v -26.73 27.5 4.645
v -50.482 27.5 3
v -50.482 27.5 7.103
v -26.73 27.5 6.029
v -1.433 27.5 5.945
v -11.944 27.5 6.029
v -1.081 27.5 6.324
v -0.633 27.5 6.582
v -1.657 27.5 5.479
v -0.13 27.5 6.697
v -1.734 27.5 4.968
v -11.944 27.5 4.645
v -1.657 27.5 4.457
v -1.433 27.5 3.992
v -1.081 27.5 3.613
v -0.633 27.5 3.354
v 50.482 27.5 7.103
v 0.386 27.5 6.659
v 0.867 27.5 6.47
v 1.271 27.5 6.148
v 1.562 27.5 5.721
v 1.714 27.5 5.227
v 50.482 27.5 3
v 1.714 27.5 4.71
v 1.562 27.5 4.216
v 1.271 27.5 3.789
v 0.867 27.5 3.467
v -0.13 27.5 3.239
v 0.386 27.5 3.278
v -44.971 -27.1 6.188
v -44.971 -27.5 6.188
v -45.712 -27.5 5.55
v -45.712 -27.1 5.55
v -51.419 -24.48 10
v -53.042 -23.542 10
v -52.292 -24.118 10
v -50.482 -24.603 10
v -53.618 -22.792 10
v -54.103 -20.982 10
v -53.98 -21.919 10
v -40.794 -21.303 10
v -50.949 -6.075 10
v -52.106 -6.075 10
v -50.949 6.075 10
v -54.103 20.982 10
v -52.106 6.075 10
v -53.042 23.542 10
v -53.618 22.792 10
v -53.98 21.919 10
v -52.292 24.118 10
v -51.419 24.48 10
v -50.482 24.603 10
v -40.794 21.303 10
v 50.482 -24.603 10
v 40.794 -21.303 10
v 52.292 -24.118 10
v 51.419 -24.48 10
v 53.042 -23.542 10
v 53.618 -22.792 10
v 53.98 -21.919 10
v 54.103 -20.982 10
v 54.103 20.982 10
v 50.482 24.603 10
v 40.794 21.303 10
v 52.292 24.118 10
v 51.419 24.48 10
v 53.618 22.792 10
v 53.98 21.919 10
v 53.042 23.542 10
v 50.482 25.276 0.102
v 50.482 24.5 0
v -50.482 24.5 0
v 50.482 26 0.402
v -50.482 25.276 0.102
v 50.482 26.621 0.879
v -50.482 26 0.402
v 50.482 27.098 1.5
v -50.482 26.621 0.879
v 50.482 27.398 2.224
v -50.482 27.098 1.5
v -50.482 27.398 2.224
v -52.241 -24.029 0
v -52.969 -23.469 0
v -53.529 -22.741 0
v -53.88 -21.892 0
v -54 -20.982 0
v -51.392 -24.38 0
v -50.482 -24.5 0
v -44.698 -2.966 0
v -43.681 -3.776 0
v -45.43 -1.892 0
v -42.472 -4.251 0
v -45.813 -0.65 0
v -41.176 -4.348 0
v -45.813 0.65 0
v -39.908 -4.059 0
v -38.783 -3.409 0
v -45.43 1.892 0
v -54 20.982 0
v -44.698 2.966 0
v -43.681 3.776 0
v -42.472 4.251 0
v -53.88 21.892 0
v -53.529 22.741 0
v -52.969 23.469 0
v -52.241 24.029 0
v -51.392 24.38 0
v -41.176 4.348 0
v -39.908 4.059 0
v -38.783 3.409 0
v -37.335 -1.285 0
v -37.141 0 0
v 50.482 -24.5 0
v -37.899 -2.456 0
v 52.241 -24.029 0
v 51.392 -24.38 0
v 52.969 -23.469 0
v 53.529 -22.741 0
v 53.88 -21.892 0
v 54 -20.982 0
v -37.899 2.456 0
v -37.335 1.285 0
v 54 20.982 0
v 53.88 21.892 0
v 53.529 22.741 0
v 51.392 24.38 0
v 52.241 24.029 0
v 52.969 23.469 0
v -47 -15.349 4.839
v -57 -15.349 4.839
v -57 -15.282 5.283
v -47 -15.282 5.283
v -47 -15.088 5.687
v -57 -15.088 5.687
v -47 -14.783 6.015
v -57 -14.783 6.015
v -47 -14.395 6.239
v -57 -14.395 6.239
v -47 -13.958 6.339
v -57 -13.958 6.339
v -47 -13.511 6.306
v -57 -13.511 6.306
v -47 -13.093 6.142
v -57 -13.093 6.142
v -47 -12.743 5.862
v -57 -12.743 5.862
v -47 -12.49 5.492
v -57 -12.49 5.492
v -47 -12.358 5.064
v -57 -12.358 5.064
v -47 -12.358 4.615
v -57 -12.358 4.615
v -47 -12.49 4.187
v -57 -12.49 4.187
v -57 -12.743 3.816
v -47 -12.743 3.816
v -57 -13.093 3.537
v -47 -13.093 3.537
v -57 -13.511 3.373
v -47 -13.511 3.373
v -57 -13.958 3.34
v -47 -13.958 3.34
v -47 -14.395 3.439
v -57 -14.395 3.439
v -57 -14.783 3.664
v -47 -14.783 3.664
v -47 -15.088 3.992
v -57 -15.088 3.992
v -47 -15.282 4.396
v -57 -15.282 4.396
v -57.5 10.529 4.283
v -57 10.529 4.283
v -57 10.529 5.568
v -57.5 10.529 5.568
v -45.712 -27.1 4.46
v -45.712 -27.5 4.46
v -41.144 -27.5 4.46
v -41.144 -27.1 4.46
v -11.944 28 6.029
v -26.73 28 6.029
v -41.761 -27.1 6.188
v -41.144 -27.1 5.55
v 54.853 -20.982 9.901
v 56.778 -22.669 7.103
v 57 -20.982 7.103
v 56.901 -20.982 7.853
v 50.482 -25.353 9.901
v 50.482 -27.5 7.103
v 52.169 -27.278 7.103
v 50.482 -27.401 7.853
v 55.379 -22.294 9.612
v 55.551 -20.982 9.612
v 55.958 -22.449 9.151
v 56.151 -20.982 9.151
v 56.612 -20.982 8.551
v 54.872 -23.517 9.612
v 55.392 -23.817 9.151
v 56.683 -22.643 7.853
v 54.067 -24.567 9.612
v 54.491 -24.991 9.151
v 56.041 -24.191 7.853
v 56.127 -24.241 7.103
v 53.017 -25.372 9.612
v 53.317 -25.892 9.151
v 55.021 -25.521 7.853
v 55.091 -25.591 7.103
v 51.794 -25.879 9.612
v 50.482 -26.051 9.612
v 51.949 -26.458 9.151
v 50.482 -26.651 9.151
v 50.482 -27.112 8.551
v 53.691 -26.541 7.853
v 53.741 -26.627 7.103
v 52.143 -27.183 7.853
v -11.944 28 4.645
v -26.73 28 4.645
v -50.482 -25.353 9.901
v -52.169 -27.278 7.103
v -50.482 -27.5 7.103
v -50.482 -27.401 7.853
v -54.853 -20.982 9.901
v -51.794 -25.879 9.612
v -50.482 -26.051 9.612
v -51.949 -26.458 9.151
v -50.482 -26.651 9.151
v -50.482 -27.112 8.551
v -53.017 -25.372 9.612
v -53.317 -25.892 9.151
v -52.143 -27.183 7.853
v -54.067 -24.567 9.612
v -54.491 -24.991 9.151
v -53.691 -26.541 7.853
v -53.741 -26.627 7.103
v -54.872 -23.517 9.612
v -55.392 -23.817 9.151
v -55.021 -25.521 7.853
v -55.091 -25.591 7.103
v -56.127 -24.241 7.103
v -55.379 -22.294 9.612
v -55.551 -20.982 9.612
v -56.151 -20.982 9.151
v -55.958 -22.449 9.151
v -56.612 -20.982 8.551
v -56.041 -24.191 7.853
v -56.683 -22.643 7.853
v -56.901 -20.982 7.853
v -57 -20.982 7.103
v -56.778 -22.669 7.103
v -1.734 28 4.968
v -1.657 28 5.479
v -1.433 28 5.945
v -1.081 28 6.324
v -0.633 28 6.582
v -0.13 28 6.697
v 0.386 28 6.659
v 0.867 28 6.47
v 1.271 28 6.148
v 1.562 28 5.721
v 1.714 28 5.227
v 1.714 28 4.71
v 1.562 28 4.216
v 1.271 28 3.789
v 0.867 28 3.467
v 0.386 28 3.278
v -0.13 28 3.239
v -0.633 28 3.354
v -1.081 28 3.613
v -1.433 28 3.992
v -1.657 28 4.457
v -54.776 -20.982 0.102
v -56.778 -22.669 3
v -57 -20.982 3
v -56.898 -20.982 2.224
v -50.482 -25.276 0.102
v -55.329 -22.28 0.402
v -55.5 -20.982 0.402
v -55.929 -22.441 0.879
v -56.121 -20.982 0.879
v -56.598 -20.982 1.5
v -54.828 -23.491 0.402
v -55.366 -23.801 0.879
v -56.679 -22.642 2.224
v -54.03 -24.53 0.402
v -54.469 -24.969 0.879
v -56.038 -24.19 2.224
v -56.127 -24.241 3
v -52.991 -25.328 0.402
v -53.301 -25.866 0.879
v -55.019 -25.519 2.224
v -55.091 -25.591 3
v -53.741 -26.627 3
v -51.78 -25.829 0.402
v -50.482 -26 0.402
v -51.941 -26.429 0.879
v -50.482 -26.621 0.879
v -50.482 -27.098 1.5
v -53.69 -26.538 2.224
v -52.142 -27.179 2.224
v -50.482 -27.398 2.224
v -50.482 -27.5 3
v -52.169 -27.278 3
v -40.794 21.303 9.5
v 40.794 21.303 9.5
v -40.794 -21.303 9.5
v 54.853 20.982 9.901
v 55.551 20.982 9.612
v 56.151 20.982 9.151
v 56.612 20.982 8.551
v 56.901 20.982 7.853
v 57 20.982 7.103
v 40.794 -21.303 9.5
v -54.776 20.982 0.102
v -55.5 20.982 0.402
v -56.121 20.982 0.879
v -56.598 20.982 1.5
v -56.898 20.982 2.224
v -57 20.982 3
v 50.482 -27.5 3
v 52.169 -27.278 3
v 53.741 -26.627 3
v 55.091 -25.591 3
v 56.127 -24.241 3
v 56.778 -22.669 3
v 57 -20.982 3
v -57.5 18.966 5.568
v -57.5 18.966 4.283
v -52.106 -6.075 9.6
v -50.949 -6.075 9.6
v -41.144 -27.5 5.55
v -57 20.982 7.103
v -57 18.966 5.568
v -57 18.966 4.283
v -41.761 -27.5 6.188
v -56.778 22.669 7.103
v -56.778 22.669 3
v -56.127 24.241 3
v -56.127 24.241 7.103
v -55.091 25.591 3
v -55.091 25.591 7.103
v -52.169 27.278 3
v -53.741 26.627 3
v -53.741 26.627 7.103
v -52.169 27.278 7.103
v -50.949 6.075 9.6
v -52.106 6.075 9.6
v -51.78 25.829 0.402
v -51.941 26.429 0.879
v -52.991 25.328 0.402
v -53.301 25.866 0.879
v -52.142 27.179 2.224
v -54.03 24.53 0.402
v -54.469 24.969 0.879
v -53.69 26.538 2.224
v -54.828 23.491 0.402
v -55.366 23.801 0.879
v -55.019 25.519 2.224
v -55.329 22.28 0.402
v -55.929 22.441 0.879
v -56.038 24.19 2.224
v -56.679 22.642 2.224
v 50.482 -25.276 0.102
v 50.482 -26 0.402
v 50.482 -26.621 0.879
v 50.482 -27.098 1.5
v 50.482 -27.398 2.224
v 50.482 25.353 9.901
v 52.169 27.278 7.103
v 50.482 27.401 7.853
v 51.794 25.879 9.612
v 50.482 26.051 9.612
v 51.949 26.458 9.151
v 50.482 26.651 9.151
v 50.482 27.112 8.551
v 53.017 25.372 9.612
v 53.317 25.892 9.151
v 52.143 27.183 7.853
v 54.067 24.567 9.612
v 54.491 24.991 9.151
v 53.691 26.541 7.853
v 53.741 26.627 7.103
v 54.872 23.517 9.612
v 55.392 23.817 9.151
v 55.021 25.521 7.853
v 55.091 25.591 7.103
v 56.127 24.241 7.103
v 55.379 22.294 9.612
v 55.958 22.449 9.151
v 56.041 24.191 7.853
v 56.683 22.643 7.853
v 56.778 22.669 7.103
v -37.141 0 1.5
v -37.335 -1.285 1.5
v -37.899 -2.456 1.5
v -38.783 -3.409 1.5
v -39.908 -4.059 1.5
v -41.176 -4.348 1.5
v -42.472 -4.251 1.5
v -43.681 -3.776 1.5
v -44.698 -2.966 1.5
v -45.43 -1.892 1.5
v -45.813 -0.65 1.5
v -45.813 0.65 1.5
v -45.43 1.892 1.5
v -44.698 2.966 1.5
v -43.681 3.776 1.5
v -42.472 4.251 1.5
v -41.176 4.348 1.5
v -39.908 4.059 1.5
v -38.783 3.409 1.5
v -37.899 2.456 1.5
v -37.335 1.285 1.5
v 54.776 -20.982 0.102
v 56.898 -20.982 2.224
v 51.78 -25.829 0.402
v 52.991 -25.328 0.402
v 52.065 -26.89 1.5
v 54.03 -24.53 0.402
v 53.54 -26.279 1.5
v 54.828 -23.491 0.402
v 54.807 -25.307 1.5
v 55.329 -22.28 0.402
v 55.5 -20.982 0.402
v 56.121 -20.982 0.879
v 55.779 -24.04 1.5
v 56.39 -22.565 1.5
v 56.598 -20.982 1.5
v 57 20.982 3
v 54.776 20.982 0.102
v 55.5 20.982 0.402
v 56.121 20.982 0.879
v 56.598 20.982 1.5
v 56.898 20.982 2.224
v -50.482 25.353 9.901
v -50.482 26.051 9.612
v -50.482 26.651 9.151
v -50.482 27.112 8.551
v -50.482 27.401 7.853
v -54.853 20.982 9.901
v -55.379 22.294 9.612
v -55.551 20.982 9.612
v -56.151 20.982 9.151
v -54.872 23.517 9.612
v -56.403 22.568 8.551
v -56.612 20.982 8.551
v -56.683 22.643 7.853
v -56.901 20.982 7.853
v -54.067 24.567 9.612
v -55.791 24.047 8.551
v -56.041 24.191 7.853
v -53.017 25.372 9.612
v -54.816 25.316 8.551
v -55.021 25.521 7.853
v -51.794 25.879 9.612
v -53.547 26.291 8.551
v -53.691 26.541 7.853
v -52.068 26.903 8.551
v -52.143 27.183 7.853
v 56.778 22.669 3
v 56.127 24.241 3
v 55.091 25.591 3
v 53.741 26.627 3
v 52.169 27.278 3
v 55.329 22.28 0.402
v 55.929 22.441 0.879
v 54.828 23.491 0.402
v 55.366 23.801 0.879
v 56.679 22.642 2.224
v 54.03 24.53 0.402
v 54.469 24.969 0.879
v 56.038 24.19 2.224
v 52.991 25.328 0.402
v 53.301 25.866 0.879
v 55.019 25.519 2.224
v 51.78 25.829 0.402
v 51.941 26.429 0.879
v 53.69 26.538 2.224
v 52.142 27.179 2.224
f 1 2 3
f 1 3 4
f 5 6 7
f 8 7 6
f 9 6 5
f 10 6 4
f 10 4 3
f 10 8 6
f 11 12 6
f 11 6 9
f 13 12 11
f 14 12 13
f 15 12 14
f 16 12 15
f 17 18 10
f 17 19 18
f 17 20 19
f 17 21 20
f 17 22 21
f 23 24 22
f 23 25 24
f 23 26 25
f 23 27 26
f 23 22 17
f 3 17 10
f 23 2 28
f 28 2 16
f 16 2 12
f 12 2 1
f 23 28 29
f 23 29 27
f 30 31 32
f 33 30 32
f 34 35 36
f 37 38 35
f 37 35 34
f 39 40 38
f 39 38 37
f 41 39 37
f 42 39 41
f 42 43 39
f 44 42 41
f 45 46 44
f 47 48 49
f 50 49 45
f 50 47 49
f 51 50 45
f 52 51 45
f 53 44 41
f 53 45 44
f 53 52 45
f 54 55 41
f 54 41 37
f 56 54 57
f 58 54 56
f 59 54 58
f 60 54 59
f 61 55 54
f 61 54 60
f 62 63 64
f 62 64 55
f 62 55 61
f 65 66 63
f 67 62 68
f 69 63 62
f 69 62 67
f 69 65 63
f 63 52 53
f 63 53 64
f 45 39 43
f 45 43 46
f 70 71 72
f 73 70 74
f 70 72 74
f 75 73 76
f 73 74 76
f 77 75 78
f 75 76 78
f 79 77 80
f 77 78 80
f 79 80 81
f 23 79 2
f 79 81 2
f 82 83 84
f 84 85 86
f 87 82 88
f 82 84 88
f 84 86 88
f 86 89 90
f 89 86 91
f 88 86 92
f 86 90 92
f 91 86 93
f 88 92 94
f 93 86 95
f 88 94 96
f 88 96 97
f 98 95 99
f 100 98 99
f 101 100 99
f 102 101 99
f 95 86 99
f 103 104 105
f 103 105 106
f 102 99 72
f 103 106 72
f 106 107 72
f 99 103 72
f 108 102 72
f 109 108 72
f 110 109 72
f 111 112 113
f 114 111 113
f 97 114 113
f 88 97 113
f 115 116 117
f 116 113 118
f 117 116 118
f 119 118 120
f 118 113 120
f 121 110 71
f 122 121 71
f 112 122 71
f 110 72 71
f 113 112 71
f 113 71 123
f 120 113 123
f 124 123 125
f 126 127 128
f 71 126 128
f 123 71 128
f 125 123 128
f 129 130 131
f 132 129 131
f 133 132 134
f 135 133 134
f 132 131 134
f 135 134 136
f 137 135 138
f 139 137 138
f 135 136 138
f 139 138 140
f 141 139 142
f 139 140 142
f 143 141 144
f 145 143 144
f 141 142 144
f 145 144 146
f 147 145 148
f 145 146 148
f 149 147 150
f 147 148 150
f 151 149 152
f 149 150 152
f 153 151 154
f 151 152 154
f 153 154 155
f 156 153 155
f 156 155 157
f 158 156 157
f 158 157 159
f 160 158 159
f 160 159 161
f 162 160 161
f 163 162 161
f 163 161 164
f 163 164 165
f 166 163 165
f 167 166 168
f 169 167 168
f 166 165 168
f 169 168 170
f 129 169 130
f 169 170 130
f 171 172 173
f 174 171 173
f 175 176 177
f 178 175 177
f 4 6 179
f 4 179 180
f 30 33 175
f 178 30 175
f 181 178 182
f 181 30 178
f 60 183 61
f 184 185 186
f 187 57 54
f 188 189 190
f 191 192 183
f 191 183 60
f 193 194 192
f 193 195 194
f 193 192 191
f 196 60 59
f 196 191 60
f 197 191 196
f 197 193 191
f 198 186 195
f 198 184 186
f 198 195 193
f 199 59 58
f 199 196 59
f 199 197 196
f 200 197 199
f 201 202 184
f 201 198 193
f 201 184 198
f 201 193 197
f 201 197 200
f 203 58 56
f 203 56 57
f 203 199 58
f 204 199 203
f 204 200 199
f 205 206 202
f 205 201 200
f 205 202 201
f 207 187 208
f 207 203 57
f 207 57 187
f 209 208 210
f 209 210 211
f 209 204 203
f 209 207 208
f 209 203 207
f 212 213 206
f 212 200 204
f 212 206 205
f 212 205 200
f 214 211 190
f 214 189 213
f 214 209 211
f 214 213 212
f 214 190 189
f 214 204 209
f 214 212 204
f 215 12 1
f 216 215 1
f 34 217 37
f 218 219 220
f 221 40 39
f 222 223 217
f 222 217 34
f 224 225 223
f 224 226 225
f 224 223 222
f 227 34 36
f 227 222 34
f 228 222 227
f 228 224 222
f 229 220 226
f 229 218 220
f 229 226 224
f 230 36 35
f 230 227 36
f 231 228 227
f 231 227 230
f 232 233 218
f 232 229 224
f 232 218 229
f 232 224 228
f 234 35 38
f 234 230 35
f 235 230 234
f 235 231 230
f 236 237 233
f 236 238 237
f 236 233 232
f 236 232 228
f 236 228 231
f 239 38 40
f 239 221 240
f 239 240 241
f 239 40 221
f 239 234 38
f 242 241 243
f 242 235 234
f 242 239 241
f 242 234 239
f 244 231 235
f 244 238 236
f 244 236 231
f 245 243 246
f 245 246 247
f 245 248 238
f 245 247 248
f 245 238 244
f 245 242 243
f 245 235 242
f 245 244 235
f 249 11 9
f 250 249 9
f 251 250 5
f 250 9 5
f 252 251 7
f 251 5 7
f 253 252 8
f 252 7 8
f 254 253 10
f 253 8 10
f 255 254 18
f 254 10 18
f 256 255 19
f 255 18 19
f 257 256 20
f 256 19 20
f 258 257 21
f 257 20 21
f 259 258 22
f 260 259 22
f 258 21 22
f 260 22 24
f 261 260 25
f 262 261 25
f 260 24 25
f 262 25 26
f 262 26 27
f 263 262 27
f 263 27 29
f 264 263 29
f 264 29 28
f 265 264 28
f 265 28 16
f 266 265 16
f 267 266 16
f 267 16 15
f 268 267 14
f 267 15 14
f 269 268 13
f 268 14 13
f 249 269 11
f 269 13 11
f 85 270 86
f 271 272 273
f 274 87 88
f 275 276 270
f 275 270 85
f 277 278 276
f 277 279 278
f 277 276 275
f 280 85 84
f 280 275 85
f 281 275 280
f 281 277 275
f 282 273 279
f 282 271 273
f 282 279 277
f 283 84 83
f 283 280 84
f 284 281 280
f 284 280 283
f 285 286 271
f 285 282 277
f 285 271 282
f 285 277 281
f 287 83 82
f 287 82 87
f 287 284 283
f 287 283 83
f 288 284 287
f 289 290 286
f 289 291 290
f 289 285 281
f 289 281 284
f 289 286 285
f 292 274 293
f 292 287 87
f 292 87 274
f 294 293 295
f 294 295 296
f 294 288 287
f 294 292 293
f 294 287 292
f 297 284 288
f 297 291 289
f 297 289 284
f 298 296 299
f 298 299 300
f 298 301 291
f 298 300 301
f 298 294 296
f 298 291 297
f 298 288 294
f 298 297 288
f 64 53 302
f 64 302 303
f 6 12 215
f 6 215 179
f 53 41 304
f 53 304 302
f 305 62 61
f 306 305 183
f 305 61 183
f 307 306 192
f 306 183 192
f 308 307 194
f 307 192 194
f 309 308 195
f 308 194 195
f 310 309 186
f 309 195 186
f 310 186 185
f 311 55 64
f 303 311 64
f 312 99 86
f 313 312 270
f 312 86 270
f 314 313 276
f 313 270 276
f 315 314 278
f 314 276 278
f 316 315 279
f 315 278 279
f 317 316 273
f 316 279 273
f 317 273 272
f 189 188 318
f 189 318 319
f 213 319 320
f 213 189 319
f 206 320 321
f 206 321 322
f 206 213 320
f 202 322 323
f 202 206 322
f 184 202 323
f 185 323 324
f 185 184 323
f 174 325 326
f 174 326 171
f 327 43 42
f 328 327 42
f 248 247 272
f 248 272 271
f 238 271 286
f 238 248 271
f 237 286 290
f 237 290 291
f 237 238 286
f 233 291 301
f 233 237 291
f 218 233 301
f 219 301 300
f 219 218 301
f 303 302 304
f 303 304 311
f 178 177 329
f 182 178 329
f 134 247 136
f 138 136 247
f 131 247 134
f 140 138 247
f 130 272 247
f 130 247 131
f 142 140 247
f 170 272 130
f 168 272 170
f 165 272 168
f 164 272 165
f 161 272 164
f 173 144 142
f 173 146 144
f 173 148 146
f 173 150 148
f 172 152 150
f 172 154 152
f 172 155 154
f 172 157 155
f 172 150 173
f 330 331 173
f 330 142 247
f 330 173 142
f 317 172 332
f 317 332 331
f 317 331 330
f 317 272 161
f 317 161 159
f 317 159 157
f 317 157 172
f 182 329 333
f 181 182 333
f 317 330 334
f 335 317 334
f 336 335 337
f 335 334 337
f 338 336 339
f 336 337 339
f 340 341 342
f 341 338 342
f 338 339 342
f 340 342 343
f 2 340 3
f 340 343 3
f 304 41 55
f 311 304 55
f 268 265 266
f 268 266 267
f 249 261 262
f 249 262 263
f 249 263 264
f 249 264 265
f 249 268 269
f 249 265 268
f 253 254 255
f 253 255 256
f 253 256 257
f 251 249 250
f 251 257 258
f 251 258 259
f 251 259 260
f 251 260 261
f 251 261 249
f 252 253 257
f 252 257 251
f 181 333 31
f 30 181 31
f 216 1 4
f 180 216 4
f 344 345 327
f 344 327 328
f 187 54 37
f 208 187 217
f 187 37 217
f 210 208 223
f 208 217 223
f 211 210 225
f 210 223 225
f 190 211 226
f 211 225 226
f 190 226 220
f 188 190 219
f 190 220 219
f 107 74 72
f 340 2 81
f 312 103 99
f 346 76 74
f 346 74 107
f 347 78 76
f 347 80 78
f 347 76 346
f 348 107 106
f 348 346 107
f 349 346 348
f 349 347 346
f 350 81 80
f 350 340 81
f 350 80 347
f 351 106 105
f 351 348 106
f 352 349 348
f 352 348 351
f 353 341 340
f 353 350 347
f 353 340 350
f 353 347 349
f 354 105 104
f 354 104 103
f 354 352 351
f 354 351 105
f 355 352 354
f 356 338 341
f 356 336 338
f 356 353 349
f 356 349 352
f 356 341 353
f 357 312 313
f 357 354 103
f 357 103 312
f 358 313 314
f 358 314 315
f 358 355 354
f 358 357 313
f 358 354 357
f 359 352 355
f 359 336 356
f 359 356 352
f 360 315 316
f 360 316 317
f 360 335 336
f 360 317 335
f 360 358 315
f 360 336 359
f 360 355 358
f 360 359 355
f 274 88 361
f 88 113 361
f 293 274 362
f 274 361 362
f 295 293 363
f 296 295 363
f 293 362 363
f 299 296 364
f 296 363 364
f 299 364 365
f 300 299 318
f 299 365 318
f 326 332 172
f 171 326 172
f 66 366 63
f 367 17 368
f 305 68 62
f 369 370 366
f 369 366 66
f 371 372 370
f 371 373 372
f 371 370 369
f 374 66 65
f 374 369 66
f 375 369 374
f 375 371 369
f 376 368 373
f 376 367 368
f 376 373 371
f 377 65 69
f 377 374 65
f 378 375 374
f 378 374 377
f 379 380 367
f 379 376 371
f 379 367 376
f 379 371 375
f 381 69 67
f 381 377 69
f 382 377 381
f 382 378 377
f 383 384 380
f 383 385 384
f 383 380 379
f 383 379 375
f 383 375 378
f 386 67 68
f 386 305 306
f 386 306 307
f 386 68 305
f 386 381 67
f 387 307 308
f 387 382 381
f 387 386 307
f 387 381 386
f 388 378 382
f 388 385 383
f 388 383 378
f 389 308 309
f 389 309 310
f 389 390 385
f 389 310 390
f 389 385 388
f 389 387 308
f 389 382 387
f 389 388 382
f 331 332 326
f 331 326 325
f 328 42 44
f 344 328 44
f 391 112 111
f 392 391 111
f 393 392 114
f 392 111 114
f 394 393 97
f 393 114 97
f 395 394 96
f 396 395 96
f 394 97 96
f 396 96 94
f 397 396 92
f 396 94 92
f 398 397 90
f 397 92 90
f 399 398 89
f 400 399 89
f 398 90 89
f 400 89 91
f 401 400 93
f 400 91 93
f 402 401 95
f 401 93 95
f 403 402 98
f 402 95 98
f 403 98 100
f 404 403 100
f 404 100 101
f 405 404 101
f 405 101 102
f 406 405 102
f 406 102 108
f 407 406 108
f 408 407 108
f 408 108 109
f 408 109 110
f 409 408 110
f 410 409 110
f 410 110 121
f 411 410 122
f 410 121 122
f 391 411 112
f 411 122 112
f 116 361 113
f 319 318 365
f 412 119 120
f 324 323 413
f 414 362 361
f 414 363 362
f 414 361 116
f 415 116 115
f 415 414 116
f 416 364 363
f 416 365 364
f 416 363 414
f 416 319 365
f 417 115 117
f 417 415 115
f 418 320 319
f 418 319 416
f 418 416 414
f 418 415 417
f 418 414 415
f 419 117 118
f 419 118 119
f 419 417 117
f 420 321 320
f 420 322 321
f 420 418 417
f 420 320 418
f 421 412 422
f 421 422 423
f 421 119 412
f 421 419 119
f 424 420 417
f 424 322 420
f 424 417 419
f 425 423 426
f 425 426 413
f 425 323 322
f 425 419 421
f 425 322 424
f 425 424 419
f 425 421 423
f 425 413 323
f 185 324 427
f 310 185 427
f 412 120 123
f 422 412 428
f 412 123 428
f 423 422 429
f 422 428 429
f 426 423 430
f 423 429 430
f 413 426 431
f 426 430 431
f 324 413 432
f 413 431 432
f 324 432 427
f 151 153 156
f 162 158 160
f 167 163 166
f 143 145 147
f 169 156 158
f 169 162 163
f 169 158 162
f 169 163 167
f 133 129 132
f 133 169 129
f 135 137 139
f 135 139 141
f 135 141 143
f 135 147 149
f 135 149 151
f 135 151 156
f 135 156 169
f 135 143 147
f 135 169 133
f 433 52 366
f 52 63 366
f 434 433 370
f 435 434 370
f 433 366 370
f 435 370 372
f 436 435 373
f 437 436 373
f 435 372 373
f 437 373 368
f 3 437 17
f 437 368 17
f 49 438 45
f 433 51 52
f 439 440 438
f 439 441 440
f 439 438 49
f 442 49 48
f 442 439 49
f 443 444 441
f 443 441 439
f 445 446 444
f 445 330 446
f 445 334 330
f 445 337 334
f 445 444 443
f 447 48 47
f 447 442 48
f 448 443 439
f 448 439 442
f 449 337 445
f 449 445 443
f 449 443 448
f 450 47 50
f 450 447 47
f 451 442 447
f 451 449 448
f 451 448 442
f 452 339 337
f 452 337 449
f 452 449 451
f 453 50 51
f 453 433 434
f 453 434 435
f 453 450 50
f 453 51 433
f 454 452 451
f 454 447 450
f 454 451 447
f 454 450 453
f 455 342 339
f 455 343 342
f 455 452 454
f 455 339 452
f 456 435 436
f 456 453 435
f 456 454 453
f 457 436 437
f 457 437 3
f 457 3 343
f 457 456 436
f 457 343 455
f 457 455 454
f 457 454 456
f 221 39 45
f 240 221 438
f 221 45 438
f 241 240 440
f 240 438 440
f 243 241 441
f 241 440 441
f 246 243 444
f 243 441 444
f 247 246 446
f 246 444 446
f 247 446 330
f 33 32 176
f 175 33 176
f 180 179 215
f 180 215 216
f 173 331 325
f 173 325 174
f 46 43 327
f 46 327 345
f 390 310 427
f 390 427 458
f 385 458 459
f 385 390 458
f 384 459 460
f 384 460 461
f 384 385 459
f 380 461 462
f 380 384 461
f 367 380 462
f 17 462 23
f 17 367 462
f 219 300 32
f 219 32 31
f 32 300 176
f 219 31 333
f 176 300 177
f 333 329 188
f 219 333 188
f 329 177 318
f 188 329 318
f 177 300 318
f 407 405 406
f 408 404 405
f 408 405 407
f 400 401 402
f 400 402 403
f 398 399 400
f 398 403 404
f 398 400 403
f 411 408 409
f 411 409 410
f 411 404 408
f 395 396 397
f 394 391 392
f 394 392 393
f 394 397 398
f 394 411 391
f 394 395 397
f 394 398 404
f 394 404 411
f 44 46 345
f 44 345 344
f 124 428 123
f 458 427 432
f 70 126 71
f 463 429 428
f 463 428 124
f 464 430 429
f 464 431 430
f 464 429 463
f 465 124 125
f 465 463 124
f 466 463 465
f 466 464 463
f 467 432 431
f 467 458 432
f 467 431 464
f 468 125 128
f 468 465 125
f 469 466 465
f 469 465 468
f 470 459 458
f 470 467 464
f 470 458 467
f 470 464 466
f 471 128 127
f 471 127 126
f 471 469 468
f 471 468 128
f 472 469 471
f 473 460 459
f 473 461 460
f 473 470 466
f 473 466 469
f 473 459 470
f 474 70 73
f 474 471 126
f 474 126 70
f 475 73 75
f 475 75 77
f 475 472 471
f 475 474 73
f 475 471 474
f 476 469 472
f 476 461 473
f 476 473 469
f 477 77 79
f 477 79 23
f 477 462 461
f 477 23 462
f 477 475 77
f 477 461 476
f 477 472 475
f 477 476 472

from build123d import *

# Parameters (mm, degrees)
F0_W      = 114
F0_H      = 55
F1_DEPTH  = 10
F2_R      = 6.5183766184
F3_R      = 3
F4_R      = 2.8970562748
F5_R      = 1.7337923038
F6_DEPTH  = 0.5
F7_W      = 14.7860310972
F7_H      = 1.384280622
F8_DEPTH  = 0.5
F9_R      = 4.3601608972
F10_DEPTH = 1.5
F11_W     = 1.1572175405
F11_H     = 12.150795199
F12_DEPTH = 0.4
F13_W     = 81.5876945853
F13_H     = 42.6051579416
F14_DEPTH = 0.5
F16_DEPTH = 0.4
F17_R     = 1.5038769237
F18_DEPTH = 10
F19_W     = 8.4370337427
F19_H     = 1.285196282
F20_DEPTH = 0.5


with BuildPart() as f1:
    # F0 (on Top) → F1 (new body)
    with BuildSketch(Plane.XY):
        Rectangle(F0_W, F0_H)
    extrude(amount=F1_DEPTH)

    # F2
    f2_edges = [f1.edges().sort_by_distance(p)[0] for p in [
        (57, -27.5, 5),
        (-57, -27.5, 5),
        (57, 27.5, 5),
        (-57, 27.5, 5),
    ]]
    fillet(f2_edges, radius=F2_R)

    # F3
    f3_edges = [f1.edges().sort_by_distance(p)[0] for p in [
        (55.090812, -25.590812, 0),
        (-55.090812, -25.590812, 0),
        (-55.090812, 25.590812, 0),
        (55.090812, 25.590812, 0),
    ]]
    fillet(f3_edges, radius=F3_R)

    # F4
    f4_edges = [f1.edges().sort_by_distance(p)[0] for p in [
        (0, 27.5, 10),
        (55.090812, 25.590812, 10),
        (-55.090812, 25.590812, 10),
        (57, 0, 10),
        (-57, 0, 10),
        (55.090812, -25.590812, 10),
        (-55.090812, -25.590812, 10),
        (0, -27.5, 10),
    ]]
    fillet(f4_edges, radius=F4_R)

    # F5 (on face) → F6 (join)
    with BuildSketch(Plane(origin=(0, 27.5, 0), x_dir=(-1, 0, 0), z_dir=(0, 1, 0))):
        with Locations((0, 4.9682608806)):
            Circle(F5_R)
    extrude(amount=F6_DEPTH)

    # F7 (on face) → F8 (join)
    with BuildSketch(Plane(origin=(0, 27.5, 0), x_dir=(-1, 0, 0), z_dir=(0, 1, 0))):
        with Locations((19.3366743624, 5.336954724)):
            Rectangle(F7_W, F7_H)
    extrude(amount=F8_DEPTH)

    # F9 (on face) → F10 (cut)
    with BuildSketch(Plane(origin=(0, 0, 0), x_dir=(1, 0, 0), z_dir=(0, 0, -1))):
        with Locations((-41.5013991296, 0)):
            Circle(F9_R)
    extrude(amount=-F10_DEPTH, mode=Mode.SUBTRACT)

    # F11 (on face) → F12 (cut)
    with BuildSketch(Plane.XY.offset(10)):
        with Locations((-51.5272360634, 0)):
            Rectangle(F11_W, F11_H)
    extrude(amount=-F12_DEPTH, mode=Mode.SUBTRACT)

    # F13 (on face) → F14 (cut)
    with BuildSketch(Plane.XY.offset(10)):
        Rectangle(F13_W, F13_H)
    extrude(amount=-F14_DEPTH, mode=Mode.SUBTRACT)

    # F15 (on face) → F16 (cut)
    with BuildSketch(Plane.XZ.offset(27.5)):
        Polygon((-41.7614616454, 6.1881397851), (-44.9712947011, 6.1881397851), (-45.7120239735, 5.5502885953), (-45.7120239735, 4.459768068), (-41.1441847682, 4.459768068), (-41.1441847682, 5.5502885953), align=None)
    extrude(amount=-F16_DEPTH, mode=Mode.SUBTRACT)

    # F17 (on face) → F18 (cut)
    with BuildSketch(Plane(origin=(-57, 0, 0), x_dir=(0, -1, 0), z_dir=(-1, 0, 0))):
        with Locations((13.8453152031, 4.8393858597)):
            Circle(F17_R)
    extrude(amount=-F18_DEPTH, mode=Mode.SUBTRACT)

    # F19 (on face) → F20 (join)
    with BuildSketch(Plane(origin=(-57, 0, 0), x_dir=(0, -1, 0), z_dir=(-1, 0, 0))):
        with Locations((-14.7477723658, 4.9256444909)):
            Rectangle(F19_W, F19_H)
    extrude(amount=F20_DEPTH)


solid = f1.part
